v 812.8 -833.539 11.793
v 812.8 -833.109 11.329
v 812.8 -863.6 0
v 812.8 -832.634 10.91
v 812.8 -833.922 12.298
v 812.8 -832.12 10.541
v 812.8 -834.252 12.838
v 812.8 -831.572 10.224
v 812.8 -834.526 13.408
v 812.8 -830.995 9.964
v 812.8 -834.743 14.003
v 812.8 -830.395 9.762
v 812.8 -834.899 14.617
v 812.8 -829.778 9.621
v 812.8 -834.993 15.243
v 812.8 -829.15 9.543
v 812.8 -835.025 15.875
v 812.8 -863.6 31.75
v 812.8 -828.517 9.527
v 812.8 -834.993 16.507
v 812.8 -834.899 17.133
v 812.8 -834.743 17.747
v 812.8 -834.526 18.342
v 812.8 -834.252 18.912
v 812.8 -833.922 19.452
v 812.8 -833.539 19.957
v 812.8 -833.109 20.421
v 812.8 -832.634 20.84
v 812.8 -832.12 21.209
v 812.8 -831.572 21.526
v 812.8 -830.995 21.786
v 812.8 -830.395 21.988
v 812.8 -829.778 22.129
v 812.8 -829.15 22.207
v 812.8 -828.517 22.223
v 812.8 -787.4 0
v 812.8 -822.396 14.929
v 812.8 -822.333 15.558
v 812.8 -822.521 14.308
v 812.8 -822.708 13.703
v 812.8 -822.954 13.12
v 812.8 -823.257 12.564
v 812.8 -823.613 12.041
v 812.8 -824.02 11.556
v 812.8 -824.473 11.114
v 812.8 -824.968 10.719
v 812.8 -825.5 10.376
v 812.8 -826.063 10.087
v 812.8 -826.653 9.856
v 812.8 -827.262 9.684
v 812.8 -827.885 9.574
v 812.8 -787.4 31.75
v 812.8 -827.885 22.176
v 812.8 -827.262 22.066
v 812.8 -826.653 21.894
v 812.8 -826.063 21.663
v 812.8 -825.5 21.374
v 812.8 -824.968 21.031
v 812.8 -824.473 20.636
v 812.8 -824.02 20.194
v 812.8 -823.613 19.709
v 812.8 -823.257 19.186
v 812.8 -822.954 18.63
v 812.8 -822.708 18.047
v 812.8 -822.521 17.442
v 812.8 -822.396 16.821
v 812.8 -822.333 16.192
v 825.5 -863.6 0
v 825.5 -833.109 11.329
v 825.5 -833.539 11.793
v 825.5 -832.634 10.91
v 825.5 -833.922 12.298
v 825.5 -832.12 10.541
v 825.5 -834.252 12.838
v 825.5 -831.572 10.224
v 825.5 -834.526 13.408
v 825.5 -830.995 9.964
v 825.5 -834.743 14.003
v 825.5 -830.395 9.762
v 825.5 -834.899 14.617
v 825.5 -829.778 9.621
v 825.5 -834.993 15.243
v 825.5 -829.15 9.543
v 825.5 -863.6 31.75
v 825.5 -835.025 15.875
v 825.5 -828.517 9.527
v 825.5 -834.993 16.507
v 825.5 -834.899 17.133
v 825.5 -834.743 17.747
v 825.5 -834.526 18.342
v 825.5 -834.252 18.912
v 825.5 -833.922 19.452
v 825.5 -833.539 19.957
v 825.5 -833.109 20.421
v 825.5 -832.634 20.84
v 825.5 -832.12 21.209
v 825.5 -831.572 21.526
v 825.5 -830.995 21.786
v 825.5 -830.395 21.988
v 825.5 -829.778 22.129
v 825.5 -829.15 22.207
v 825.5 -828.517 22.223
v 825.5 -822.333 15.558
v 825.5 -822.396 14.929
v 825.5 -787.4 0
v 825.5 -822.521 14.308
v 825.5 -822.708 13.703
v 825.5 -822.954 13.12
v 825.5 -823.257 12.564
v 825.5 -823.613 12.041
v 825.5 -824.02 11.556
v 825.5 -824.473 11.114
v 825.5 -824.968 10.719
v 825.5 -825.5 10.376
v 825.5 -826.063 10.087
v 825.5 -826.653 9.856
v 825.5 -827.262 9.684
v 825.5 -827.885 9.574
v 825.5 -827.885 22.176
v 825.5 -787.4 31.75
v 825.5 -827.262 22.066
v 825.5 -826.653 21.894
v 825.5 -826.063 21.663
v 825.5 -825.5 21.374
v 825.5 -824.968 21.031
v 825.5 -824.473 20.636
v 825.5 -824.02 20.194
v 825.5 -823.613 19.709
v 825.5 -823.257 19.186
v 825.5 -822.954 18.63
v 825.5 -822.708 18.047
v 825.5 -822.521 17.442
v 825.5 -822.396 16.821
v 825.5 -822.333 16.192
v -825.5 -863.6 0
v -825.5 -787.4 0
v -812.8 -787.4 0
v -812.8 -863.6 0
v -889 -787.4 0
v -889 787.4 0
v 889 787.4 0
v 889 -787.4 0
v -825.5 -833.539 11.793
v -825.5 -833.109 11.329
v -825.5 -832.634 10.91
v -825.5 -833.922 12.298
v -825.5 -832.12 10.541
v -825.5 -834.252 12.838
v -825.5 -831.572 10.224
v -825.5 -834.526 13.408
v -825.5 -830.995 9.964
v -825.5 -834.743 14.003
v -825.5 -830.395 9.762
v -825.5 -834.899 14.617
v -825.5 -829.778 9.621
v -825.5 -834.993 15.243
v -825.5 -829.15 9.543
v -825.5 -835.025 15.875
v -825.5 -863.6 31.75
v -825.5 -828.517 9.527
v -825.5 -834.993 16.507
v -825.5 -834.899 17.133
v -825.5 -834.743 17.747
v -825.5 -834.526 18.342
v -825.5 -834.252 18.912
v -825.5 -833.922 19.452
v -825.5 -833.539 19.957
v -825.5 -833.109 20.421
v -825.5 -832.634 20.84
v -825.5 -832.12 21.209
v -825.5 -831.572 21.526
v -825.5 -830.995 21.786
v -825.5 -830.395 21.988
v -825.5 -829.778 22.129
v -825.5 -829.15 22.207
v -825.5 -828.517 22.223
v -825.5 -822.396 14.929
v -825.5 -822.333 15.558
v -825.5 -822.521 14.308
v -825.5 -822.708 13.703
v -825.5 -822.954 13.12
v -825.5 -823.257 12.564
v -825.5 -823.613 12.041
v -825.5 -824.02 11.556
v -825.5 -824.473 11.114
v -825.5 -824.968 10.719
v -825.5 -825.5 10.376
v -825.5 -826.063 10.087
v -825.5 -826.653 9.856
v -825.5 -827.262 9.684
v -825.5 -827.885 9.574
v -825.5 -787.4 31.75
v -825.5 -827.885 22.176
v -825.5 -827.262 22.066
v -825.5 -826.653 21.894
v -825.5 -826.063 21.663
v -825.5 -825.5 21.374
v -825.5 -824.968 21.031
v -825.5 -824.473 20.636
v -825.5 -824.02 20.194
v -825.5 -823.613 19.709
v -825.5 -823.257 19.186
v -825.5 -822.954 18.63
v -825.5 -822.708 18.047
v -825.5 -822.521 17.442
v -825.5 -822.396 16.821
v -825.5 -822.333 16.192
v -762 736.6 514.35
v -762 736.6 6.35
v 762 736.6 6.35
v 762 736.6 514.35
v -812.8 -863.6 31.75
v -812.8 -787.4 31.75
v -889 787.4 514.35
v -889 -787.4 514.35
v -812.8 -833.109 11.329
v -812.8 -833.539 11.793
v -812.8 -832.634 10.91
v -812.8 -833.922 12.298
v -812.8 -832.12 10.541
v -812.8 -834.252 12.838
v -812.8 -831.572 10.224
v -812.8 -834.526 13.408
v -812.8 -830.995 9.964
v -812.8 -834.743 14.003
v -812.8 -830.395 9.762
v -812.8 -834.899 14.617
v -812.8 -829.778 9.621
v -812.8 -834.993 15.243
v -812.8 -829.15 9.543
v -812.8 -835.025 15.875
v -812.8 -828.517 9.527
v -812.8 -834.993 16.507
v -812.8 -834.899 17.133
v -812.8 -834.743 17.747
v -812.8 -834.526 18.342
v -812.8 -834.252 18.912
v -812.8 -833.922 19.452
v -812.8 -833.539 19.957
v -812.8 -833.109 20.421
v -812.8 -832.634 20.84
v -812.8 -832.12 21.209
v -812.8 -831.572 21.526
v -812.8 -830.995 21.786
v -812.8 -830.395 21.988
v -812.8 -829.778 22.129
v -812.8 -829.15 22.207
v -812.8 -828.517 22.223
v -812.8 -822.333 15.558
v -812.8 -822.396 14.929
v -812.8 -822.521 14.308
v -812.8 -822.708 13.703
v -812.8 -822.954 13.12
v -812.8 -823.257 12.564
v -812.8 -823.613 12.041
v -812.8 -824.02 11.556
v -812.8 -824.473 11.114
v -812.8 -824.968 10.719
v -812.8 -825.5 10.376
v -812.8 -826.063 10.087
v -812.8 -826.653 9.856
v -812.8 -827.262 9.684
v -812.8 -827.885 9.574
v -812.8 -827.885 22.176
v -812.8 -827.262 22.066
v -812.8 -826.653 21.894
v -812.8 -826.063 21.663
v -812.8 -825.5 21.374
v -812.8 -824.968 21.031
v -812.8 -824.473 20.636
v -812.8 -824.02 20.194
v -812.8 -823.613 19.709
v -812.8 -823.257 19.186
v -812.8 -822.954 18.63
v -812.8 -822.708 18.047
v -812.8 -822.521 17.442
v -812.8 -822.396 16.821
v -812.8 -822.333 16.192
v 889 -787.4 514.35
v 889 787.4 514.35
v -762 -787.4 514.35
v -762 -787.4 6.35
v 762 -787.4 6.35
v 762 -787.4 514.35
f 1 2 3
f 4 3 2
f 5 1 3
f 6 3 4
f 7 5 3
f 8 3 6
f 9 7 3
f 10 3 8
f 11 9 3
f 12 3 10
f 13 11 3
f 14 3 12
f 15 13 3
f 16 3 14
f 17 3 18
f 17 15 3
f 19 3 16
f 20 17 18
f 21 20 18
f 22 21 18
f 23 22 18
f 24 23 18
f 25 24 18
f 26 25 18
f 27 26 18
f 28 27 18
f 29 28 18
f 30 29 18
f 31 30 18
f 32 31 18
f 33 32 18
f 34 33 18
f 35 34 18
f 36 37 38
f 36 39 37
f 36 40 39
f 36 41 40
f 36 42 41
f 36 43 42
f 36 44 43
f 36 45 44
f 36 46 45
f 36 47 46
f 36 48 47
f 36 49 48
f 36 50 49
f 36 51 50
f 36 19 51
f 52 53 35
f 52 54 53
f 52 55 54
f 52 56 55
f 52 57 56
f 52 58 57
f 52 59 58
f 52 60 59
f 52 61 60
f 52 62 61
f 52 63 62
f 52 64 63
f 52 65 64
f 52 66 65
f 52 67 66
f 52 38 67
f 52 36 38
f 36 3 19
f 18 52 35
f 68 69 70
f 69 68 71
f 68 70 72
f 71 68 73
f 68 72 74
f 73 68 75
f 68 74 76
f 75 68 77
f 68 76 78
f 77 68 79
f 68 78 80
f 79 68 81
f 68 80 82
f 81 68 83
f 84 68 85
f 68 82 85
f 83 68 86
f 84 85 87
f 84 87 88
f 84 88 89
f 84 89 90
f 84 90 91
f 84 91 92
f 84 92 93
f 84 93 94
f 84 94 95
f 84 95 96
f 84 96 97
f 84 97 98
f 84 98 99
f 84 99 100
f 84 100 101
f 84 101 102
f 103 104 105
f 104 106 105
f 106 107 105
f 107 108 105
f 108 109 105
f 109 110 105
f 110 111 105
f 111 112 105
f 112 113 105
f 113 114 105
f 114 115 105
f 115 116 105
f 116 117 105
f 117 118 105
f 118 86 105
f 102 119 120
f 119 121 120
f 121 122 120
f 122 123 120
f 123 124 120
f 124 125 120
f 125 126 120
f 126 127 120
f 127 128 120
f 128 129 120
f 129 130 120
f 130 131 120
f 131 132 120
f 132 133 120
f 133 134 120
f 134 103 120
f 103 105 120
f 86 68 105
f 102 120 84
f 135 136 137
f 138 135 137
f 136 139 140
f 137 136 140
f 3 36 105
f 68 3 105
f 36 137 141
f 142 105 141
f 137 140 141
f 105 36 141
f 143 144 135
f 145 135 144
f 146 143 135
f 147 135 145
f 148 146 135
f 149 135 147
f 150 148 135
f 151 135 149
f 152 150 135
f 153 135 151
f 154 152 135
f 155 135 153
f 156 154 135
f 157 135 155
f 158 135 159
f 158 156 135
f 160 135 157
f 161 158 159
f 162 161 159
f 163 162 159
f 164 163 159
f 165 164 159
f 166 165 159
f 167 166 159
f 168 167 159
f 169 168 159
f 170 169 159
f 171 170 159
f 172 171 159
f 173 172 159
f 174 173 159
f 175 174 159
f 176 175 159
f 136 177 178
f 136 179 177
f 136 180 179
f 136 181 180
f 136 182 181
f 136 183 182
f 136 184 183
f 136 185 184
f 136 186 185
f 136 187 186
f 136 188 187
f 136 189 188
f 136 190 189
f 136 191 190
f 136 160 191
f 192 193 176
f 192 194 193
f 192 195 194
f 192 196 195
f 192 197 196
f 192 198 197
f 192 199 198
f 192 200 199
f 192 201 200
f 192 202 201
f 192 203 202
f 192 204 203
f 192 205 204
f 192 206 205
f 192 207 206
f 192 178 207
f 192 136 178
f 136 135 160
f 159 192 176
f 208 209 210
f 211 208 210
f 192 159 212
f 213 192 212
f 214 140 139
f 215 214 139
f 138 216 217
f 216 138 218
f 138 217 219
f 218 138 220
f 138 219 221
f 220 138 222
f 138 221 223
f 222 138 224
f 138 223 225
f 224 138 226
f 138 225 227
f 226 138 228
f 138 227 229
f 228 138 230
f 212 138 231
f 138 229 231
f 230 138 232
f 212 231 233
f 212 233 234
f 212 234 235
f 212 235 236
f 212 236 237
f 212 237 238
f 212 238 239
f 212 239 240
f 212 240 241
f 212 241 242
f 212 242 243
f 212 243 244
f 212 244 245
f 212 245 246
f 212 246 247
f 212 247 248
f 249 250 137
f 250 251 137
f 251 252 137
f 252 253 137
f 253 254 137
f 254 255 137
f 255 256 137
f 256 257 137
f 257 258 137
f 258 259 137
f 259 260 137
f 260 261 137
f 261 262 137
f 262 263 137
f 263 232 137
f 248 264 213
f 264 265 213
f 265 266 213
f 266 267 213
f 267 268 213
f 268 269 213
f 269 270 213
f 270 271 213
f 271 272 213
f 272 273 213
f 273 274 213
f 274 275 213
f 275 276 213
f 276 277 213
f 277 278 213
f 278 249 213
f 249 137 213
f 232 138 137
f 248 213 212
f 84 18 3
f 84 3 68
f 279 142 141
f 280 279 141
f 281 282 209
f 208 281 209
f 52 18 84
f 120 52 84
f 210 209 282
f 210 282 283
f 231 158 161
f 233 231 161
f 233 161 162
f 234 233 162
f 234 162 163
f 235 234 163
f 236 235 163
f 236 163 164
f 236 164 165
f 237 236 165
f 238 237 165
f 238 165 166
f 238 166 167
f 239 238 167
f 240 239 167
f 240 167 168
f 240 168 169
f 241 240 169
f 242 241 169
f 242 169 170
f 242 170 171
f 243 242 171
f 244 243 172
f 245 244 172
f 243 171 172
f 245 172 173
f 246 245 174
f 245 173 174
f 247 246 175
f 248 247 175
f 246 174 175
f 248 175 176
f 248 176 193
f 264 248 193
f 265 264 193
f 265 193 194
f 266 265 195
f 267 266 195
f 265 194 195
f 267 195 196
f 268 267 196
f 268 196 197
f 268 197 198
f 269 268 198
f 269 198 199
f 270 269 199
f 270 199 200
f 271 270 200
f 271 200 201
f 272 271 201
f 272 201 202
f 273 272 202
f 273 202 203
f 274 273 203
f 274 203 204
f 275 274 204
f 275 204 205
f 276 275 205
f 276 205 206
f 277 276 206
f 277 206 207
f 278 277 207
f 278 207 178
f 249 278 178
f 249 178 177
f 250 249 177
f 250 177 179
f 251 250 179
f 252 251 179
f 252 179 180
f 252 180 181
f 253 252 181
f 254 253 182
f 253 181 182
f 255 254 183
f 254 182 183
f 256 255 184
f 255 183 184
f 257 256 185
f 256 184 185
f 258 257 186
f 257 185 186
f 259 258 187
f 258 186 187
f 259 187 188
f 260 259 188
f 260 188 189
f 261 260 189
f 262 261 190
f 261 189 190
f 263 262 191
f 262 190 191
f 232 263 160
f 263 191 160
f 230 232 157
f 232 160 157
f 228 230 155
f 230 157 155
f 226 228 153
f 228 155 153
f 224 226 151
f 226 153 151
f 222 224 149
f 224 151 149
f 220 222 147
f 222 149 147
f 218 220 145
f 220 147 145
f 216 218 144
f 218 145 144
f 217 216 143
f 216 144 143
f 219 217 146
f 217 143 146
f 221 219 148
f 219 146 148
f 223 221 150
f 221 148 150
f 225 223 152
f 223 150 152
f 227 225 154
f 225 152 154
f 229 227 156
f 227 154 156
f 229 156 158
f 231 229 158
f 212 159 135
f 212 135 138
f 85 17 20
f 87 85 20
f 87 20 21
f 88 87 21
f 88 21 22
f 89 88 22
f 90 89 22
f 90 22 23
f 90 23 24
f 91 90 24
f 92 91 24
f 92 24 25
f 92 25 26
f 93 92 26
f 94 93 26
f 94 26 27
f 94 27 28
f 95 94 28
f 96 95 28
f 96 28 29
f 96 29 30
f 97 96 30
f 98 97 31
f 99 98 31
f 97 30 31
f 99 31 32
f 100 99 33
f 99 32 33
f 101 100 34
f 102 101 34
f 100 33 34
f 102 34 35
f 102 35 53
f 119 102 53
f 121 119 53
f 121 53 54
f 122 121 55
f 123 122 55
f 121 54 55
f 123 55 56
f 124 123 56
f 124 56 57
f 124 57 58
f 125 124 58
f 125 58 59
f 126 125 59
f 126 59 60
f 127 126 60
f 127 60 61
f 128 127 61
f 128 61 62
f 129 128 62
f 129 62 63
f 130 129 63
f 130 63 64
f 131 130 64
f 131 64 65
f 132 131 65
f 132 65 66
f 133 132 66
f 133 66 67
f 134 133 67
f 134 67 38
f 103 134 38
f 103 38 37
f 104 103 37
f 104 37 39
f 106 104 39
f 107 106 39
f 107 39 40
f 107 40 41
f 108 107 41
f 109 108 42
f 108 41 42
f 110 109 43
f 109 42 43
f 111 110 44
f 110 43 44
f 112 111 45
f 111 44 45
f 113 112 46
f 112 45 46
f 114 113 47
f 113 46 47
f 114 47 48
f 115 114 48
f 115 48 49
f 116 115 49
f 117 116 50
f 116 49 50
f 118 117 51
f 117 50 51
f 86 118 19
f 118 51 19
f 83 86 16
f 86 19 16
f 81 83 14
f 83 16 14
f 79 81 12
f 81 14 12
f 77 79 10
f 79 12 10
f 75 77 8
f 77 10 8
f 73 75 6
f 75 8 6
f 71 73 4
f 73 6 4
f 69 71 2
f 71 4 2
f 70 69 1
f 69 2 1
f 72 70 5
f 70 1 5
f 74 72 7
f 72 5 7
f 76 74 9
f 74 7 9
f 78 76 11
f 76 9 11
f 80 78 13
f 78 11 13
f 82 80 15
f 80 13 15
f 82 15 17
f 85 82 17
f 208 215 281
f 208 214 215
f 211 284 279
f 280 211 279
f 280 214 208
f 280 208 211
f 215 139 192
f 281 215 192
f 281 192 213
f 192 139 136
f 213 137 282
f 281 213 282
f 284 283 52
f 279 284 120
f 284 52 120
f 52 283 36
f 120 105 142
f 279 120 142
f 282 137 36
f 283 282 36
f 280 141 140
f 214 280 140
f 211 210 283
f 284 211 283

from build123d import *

# Parameters (mm, degrees)
F0_W     = 1778
F0_H     = 1574.8
F1_DEPTH = 6.35
F3_DEPTH = 508
F4_W     = 12.7
F4_H     = 31.75
F5_DEPTH = 76.2
F6_R     = 6.35
F7_DEPTH = 1714.501


with BuildPart() as f1:
    # F0 (on Top) → F1 (new body)
    with BuildSketch(Plane.XY):
        Rectangle(F0_W, F0_H)
    extrude(amount=F1_DEPTH)

    # F2 (on face) → F3 (join)
    with BuildSketch(Plane.XY.offset(6.35)):
        Polygon((-889, 736.6), (-889, -787.4), (-762, -787.4), (-762, 736.6), (762, 736.6), (762, -787.4), (889, -787.4), (889, 736.6), (889, 787.4), (762, 787.4), (-762, 787.4), (-889, 787.4), align=None)
    extrude(amount=F3_DEPTH)

    # F4 (on face) → F5 (join)
    with BuildSketch(Plane.XZ.offset(787.4)):
        with Locations((-819.15, 15.875)):
            Rectangle(F4_W, F4_H)
        with Locations((819.15, 15.875)):
            Rectangle(F4_W, F4_H)
    extrude(amount=F5_DEPTH)

    # F6 (on face) → F7 (cut, through all)
    with BuildSketch(Plane(origin=(-825.5, 0, 0), x_dir=(0, -1, 0), z_dir=(-1, 0, 0))):
        with Locations((828.675, 15.875)):
            Circle(F6_R)
    extrude(amount=-F7_DEPTH, mode=Mode.SUBTRACT)


solid = f1.part
